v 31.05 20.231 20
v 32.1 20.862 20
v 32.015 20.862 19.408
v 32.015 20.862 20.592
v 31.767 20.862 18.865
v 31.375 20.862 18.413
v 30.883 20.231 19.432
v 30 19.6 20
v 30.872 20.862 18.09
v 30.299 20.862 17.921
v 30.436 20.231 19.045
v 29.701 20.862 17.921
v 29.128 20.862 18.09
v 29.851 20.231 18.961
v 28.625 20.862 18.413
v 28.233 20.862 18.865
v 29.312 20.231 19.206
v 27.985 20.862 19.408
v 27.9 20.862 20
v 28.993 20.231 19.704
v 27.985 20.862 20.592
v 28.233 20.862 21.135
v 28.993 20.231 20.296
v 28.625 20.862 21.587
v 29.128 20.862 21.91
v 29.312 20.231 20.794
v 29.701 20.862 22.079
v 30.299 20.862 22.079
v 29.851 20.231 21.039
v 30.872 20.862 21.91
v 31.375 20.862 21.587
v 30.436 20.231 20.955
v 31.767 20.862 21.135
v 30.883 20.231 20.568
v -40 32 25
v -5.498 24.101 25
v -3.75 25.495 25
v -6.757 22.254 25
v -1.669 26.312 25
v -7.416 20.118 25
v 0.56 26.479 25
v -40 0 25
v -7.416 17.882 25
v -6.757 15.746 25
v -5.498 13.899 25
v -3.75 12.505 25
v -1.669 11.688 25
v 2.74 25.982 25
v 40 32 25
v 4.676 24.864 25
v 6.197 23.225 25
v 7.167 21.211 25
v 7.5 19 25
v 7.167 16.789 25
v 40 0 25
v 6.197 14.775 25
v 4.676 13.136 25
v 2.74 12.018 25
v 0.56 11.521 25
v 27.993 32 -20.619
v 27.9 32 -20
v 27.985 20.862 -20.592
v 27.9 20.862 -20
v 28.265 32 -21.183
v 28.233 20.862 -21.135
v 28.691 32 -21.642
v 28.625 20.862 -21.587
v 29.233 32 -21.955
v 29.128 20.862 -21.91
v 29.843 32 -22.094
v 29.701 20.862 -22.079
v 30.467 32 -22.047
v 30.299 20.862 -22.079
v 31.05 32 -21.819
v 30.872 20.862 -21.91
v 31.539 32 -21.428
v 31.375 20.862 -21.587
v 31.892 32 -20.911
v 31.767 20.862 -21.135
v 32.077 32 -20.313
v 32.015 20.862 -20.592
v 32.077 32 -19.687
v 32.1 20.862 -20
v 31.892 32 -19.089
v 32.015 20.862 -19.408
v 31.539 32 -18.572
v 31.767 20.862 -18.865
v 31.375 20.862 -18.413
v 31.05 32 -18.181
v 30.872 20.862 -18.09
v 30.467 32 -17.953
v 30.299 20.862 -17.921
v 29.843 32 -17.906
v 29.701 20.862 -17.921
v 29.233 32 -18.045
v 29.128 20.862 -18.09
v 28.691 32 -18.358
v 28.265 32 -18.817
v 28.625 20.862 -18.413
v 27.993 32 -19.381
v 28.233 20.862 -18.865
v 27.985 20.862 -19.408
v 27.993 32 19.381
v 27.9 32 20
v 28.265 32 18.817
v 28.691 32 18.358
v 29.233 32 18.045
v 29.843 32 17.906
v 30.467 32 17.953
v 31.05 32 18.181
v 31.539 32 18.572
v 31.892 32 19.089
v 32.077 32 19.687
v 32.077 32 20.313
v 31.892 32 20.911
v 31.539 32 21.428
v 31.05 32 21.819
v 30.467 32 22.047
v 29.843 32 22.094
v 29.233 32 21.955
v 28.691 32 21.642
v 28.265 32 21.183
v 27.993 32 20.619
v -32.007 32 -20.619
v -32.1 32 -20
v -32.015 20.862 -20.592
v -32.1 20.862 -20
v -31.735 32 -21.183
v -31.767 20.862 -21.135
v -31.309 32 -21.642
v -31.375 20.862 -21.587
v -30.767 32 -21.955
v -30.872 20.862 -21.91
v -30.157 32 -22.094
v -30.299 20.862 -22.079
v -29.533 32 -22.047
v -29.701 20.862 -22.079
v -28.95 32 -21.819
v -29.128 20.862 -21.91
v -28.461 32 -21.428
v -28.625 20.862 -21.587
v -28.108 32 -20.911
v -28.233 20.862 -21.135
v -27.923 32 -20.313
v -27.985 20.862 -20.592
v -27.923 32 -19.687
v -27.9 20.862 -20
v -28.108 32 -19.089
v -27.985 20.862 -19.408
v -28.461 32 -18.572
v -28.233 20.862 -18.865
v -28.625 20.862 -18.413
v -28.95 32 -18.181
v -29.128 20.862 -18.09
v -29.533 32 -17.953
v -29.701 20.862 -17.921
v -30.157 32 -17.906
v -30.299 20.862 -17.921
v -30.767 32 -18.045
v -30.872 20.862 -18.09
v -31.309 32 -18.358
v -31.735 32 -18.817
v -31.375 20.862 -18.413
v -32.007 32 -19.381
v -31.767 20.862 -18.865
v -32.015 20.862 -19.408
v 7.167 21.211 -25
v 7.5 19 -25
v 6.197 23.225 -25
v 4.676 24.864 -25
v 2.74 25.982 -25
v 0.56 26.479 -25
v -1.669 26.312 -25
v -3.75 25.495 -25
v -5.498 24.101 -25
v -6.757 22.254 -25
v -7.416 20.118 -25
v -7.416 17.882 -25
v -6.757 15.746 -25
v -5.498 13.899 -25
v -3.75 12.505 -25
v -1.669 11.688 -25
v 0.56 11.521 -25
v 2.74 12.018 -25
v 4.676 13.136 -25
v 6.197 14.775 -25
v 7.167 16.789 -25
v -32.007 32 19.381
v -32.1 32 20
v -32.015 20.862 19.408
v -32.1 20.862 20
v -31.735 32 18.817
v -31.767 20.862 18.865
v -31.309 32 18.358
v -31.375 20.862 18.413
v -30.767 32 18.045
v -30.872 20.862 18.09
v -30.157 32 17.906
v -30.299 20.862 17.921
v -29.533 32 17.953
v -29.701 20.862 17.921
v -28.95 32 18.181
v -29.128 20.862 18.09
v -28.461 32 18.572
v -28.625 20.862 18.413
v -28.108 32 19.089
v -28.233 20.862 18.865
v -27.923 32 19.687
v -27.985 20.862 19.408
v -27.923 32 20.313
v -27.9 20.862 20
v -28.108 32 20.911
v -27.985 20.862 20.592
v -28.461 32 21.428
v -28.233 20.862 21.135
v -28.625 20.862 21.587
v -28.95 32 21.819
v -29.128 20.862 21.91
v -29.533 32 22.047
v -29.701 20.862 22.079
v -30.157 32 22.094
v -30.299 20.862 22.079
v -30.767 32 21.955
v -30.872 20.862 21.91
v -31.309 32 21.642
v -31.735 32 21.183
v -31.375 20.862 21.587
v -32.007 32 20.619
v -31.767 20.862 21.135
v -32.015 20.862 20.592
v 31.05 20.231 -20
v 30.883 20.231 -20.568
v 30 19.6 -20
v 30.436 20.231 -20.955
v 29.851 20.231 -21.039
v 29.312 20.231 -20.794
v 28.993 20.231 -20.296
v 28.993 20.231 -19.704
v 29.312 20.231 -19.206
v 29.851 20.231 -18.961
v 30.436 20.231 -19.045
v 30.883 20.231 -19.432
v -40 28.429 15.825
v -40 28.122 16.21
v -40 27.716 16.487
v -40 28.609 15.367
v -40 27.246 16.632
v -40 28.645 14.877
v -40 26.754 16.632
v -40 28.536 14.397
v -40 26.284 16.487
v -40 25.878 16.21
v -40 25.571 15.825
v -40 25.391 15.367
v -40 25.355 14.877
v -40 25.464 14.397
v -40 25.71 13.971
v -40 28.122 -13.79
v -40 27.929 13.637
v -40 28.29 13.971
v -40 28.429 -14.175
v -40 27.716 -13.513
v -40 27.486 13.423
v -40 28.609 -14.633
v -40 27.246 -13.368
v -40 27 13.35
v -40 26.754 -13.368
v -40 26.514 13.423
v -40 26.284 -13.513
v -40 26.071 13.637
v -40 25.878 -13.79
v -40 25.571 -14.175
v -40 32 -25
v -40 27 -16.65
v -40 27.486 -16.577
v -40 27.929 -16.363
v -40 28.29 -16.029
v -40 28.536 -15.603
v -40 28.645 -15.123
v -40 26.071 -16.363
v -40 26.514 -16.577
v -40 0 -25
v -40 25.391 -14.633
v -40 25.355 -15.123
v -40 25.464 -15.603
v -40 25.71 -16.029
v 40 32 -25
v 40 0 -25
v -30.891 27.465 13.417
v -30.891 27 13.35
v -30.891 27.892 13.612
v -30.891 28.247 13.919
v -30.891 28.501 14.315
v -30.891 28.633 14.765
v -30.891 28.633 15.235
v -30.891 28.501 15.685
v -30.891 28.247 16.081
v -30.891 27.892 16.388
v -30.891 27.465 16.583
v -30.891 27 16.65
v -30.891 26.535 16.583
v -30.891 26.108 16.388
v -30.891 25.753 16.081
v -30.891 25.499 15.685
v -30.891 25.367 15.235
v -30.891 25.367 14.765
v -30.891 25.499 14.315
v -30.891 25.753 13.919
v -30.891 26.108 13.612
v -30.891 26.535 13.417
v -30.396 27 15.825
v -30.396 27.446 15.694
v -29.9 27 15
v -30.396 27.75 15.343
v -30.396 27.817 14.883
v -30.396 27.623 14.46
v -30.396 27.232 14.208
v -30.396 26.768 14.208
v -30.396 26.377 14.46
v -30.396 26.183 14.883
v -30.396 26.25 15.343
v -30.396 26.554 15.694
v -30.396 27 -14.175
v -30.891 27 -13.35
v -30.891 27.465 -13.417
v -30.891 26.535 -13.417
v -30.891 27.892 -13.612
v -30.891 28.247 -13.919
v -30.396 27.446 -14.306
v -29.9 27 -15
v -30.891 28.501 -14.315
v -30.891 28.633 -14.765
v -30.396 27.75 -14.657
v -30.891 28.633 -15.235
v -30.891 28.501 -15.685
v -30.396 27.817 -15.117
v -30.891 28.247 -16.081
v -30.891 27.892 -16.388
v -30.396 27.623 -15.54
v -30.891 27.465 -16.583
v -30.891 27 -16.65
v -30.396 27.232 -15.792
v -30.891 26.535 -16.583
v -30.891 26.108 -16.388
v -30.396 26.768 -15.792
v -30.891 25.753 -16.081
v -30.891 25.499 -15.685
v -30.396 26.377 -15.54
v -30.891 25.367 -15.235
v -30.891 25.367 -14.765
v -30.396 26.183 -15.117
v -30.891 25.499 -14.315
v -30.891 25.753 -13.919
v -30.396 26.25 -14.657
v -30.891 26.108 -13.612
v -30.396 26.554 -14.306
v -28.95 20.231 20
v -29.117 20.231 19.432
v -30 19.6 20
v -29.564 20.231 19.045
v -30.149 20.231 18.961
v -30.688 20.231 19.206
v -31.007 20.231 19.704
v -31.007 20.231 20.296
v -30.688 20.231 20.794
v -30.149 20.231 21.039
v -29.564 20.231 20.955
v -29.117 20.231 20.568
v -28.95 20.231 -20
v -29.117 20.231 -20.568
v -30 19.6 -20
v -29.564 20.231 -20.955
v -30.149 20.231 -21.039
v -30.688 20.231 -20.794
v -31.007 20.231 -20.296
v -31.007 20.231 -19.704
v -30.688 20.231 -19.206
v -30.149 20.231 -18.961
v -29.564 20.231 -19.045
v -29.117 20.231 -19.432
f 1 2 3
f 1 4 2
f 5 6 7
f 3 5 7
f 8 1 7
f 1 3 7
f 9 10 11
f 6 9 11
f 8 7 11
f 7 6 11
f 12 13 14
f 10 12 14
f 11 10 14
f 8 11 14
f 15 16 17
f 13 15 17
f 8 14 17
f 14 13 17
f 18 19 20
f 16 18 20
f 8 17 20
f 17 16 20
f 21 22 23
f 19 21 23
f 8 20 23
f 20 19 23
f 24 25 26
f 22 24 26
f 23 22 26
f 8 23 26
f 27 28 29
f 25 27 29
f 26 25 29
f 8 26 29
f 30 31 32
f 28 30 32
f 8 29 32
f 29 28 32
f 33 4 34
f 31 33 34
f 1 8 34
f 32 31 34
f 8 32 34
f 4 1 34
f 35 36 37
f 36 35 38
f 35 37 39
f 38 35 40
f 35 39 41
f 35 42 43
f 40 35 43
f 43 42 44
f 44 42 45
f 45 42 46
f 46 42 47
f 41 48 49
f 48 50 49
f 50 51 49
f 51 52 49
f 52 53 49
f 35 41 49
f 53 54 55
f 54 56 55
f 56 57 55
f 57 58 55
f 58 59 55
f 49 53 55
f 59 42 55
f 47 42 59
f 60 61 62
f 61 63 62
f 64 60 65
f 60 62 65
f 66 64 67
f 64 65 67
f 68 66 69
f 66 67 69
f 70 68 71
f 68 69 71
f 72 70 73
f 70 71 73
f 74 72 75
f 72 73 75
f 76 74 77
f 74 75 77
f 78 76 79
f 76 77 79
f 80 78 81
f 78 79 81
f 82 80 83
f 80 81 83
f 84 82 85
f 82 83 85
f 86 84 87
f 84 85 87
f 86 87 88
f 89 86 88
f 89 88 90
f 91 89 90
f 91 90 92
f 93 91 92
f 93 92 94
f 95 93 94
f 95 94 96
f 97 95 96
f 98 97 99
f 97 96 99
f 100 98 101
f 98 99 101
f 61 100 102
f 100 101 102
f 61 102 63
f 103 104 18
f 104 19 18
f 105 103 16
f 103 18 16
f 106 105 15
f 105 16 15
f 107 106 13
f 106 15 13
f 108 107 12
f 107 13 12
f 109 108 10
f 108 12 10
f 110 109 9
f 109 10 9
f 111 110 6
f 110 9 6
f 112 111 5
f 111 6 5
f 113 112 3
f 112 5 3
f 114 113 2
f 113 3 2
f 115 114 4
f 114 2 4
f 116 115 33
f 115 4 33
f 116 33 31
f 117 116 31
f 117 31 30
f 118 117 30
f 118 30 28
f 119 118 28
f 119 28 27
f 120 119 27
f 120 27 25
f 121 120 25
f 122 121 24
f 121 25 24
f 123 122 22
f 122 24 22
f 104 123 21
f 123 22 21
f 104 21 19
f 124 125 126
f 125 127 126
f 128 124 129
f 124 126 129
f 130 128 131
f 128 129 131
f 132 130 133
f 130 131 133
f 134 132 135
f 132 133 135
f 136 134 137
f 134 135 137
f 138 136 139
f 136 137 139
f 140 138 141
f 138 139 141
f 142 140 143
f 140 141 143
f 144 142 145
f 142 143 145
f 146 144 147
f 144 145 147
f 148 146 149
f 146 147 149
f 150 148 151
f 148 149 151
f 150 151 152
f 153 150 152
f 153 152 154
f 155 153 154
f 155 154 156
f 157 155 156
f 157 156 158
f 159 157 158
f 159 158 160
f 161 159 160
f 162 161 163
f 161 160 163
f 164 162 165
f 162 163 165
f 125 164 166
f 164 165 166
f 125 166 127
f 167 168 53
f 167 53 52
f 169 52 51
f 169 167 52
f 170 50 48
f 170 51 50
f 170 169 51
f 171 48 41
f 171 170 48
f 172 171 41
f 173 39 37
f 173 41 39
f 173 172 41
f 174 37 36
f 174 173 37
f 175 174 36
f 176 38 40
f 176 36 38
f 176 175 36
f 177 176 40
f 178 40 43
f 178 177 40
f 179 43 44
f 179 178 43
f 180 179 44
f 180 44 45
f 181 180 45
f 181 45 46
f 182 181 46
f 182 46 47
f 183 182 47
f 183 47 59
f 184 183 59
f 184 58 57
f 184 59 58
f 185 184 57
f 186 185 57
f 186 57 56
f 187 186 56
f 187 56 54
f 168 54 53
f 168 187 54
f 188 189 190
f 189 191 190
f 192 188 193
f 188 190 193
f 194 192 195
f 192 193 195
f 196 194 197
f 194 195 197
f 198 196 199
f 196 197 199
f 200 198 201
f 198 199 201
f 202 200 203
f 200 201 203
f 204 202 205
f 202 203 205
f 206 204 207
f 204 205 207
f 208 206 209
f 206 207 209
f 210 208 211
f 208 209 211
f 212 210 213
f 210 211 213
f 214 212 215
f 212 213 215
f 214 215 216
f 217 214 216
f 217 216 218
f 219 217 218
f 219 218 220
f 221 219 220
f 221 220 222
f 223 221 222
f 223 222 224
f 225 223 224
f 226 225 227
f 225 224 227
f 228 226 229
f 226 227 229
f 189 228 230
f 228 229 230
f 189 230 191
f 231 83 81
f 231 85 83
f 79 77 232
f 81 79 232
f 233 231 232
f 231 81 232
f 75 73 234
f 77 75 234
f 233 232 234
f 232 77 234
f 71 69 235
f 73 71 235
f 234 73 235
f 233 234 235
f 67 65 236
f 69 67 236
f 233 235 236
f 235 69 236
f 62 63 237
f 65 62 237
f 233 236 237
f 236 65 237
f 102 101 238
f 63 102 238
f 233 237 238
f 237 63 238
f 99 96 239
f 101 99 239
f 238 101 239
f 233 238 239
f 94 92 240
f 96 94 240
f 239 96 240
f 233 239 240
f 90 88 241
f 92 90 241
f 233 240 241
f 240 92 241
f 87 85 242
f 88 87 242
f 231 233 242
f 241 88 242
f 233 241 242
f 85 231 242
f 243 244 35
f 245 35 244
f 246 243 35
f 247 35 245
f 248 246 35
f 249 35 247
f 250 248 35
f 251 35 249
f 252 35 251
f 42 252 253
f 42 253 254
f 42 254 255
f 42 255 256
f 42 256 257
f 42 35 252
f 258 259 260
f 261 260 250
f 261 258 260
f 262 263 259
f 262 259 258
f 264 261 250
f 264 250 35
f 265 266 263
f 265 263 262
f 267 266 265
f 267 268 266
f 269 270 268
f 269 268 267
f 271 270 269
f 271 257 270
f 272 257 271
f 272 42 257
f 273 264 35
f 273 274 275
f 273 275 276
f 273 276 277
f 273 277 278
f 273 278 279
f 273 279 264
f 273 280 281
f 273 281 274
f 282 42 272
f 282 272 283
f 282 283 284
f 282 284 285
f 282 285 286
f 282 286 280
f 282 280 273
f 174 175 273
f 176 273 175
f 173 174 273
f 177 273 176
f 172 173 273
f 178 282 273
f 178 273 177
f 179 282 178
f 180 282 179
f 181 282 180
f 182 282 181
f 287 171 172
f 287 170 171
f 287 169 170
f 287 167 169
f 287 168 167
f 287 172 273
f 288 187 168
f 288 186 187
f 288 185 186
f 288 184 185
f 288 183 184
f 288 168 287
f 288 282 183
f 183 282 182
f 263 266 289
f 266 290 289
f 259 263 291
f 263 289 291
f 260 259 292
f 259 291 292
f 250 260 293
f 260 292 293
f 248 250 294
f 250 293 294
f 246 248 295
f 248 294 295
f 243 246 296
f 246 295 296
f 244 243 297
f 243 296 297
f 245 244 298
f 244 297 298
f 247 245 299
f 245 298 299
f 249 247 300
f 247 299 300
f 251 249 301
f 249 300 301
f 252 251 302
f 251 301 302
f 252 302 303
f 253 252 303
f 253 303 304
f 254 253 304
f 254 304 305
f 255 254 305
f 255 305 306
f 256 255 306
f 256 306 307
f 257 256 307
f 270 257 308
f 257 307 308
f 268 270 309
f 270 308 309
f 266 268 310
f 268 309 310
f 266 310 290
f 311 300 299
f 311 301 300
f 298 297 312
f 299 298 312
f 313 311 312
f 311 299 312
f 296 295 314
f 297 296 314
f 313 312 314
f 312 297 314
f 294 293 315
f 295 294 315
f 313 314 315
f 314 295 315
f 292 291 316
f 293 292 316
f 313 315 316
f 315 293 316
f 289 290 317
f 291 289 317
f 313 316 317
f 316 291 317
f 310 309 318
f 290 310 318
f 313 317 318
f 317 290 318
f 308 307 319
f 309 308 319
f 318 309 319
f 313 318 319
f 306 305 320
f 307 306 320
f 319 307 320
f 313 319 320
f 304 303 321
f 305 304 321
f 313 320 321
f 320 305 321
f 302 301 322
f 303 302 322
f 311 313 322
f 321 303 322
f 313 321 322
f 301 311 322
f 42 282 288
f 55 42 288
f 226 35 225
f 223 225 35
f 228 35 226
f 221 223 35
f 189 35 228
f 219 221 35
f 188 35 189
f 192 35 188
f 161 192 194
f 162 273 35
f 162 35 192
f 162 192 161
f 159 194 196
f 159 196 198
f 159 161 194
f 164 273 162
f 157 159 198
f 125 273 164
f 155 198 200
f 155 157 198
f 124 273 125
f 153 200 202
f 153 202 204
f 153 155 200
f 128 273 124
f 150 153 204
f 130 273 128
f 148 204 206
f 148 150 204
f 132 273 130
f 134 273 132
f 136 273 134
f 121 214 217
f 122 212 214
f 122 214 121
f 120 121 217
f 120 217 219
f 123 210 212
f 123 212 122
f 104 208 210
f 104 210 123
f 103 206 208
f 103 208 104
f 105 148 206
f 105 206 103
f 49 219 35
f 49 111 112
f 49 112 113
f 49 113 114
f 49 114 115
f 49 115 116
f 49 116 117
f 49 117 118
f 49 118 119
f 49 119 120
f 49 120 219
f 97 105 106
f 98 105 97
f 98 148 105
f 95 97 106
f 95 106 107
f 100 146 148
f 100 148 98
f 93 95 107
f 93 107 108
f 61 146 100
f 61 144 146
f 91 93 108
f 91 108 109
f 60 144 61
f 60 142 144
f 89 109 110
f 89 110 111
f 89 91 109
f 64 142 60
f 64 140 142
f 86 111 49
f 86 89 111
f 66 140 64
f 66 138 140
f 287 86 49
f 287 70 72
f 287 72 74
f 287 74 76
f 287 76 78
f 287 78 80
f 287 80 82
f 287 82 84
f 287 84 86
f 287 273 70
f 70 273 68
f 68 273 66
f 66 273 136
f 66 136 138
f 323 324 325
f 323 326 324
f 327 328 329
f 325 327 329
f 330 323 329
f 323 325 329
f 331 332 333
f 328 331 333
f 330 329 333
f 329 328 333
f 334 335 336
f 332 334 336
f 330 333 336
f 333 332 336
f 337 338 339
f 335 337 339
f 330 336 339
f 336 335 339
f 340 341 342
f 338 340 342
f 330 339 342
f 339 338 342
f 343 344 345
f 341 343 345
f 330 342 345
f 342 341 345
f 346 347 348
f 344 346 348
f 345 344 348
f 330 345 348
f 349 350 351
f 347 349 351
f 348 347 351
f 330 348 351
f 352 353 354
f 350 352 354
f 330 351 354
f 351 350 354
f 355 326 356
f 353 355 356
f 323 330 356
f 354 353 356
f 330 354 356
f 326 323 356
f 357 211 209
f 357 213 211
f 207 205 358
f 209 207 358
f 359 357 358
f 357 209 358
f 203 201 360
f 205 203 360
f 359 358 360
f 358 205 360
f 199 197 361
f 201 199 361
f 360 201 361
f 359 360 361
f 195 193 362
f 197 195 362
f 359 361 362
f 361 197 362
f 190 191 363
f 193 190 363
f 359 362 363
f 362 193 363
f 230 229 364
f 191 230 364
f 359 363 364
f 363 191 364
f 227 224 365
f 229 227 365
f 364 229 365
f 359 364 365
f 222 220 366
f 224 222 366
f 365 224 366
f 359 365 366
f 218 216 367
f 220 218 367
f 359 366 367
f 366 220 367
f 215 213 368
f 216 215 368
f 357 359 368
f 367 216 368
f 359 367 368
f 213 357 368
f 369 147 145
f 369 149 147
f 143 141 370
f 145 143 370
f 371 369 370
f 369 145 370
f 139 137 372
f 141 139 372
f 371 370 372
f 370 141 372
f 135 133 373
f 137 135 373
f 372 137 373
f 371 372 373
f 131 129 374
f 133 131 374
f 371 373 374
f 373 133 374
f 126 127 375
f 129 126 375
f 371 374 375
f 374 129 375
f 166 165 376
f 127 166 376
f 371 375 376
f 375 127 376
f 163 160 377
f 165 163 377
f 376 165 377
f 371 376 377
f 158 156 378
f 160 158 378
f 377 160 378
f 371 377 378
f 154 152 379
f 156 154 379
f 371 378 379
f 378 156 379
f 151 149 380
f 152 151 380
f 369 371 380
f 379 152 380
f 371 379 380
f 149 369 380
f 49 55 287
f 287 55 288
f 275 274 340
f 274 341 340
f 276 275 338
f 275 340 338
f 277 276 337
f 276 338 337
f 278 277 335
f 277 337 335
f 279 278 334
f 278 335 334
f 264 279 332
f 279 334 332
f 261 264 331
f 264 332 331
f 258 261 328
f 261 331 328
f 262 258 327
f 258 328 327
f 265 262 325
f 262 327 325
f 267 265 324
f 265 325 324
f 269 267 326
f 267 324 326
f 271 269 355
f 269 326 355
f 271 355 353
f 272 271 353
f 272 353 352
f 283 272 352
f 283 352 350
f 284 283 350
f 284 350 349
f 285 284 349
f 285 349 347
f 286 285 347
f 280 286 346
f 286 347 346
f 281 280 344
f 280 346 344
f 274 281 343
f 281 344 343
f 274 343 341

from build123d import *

# Parameters (mm, degrees)
SKETCH_1_W               = 80
SKETCH_1_H               = 50
EXTRUDE_1_DEPTH          = 32
CUT_EXTRUDE_1_DEPTH      = 72.582120673
CUT_EXTRUDE_1_DEPTH_BACK = 72.582120673
SKETCH_2_R               = 7.5
HOLE_WIZARD_M5_1_D       = 4.2
HOLE_WIZARD_M5_1_DEPTH   = 11.1381927
HOLE_WIZARD_M5_1_TIP     = 1.2618073
HOLE_WIZARD_M4_1_D       = 3.3
HOLE_WIZARD_M4_1_DEPTH   = 9.108579979
HOLE_WIZARD_M4_1_TIP     = 0.991420021


with BuildPart() as part:
    # 草图1 → 凸台-拉伸1 (new body)
    with BuildSketch(Plane(origin=(0, 0, 0), x_dir=(1, 0, 0), z_dir=(0, 1, 0))):
        Rectangle(SKETCH_1_W, SKETCH_1_H)
    extrude(amount=EXTRUDE_1_DEPTH)

    # 草图2 → 切除-拉伸1 (cut, two sides: drawn at the far end of the back side and taken through both)
    with BuildSketch(Plane.XY.offset(25).offset(-CUT_EXTRUDE_1_DEPTH_BACK)):
        with Locations((0, 19)):
            Circle(SKETCH_2_R)
    extrude(amount=CUT_EXTRUDE_1_DEPTH + CUT_EXTRUDE_1_DEPTH_BACK, mode=Mode.SUBTRACT)

    # M5 螺纹孔1
    with Locations(Plane(origin=(0, 32, 0), x_dir=(1, 0, 0), z_dir=(0, 1, 0))):
        with Locations((-30, 20), (30, 20), (30, -20), (-30, -20)):
            Hole(HOLE_WIZARD_M5_1_D / 2, depth=HOLE_WIZARD_M5_1_DEPTH)
            with Locations((0, 0, -(HOLE_WIZARD_M5_1_DEPTH + HOLE_WIZARD_M5_1_TIP / 2))):  # 118° drill point
                Cone(0, HOLE_WIZARD_M5_1_D / 2, HOLE_WIZARD_M5_1_TIP, mode=Mode.SUBTRACT)

    # M4 螺纹孔1
    with Locations(Plane.ZY.offset(40)):
        with Locations((-15, 27), (15, 27)):
            Hole(HOLE_WIZARD_M4_1_D / 2, depth=HOLE_WIZARD_M4_1_DEPTH)
            with Locations((0, 0, -(HOLE_WIZARD_M4_1_DEPTH + HOLE_WIZARD_M4_1_TIP / 2))):  # 118° drill point
                Cone(0, HOLE_WIZARD_M4_1_D / 2, HOLE_WIZARD_M4_1_TIP, mode=Mode.SUBTRACT)


solid = part.part
